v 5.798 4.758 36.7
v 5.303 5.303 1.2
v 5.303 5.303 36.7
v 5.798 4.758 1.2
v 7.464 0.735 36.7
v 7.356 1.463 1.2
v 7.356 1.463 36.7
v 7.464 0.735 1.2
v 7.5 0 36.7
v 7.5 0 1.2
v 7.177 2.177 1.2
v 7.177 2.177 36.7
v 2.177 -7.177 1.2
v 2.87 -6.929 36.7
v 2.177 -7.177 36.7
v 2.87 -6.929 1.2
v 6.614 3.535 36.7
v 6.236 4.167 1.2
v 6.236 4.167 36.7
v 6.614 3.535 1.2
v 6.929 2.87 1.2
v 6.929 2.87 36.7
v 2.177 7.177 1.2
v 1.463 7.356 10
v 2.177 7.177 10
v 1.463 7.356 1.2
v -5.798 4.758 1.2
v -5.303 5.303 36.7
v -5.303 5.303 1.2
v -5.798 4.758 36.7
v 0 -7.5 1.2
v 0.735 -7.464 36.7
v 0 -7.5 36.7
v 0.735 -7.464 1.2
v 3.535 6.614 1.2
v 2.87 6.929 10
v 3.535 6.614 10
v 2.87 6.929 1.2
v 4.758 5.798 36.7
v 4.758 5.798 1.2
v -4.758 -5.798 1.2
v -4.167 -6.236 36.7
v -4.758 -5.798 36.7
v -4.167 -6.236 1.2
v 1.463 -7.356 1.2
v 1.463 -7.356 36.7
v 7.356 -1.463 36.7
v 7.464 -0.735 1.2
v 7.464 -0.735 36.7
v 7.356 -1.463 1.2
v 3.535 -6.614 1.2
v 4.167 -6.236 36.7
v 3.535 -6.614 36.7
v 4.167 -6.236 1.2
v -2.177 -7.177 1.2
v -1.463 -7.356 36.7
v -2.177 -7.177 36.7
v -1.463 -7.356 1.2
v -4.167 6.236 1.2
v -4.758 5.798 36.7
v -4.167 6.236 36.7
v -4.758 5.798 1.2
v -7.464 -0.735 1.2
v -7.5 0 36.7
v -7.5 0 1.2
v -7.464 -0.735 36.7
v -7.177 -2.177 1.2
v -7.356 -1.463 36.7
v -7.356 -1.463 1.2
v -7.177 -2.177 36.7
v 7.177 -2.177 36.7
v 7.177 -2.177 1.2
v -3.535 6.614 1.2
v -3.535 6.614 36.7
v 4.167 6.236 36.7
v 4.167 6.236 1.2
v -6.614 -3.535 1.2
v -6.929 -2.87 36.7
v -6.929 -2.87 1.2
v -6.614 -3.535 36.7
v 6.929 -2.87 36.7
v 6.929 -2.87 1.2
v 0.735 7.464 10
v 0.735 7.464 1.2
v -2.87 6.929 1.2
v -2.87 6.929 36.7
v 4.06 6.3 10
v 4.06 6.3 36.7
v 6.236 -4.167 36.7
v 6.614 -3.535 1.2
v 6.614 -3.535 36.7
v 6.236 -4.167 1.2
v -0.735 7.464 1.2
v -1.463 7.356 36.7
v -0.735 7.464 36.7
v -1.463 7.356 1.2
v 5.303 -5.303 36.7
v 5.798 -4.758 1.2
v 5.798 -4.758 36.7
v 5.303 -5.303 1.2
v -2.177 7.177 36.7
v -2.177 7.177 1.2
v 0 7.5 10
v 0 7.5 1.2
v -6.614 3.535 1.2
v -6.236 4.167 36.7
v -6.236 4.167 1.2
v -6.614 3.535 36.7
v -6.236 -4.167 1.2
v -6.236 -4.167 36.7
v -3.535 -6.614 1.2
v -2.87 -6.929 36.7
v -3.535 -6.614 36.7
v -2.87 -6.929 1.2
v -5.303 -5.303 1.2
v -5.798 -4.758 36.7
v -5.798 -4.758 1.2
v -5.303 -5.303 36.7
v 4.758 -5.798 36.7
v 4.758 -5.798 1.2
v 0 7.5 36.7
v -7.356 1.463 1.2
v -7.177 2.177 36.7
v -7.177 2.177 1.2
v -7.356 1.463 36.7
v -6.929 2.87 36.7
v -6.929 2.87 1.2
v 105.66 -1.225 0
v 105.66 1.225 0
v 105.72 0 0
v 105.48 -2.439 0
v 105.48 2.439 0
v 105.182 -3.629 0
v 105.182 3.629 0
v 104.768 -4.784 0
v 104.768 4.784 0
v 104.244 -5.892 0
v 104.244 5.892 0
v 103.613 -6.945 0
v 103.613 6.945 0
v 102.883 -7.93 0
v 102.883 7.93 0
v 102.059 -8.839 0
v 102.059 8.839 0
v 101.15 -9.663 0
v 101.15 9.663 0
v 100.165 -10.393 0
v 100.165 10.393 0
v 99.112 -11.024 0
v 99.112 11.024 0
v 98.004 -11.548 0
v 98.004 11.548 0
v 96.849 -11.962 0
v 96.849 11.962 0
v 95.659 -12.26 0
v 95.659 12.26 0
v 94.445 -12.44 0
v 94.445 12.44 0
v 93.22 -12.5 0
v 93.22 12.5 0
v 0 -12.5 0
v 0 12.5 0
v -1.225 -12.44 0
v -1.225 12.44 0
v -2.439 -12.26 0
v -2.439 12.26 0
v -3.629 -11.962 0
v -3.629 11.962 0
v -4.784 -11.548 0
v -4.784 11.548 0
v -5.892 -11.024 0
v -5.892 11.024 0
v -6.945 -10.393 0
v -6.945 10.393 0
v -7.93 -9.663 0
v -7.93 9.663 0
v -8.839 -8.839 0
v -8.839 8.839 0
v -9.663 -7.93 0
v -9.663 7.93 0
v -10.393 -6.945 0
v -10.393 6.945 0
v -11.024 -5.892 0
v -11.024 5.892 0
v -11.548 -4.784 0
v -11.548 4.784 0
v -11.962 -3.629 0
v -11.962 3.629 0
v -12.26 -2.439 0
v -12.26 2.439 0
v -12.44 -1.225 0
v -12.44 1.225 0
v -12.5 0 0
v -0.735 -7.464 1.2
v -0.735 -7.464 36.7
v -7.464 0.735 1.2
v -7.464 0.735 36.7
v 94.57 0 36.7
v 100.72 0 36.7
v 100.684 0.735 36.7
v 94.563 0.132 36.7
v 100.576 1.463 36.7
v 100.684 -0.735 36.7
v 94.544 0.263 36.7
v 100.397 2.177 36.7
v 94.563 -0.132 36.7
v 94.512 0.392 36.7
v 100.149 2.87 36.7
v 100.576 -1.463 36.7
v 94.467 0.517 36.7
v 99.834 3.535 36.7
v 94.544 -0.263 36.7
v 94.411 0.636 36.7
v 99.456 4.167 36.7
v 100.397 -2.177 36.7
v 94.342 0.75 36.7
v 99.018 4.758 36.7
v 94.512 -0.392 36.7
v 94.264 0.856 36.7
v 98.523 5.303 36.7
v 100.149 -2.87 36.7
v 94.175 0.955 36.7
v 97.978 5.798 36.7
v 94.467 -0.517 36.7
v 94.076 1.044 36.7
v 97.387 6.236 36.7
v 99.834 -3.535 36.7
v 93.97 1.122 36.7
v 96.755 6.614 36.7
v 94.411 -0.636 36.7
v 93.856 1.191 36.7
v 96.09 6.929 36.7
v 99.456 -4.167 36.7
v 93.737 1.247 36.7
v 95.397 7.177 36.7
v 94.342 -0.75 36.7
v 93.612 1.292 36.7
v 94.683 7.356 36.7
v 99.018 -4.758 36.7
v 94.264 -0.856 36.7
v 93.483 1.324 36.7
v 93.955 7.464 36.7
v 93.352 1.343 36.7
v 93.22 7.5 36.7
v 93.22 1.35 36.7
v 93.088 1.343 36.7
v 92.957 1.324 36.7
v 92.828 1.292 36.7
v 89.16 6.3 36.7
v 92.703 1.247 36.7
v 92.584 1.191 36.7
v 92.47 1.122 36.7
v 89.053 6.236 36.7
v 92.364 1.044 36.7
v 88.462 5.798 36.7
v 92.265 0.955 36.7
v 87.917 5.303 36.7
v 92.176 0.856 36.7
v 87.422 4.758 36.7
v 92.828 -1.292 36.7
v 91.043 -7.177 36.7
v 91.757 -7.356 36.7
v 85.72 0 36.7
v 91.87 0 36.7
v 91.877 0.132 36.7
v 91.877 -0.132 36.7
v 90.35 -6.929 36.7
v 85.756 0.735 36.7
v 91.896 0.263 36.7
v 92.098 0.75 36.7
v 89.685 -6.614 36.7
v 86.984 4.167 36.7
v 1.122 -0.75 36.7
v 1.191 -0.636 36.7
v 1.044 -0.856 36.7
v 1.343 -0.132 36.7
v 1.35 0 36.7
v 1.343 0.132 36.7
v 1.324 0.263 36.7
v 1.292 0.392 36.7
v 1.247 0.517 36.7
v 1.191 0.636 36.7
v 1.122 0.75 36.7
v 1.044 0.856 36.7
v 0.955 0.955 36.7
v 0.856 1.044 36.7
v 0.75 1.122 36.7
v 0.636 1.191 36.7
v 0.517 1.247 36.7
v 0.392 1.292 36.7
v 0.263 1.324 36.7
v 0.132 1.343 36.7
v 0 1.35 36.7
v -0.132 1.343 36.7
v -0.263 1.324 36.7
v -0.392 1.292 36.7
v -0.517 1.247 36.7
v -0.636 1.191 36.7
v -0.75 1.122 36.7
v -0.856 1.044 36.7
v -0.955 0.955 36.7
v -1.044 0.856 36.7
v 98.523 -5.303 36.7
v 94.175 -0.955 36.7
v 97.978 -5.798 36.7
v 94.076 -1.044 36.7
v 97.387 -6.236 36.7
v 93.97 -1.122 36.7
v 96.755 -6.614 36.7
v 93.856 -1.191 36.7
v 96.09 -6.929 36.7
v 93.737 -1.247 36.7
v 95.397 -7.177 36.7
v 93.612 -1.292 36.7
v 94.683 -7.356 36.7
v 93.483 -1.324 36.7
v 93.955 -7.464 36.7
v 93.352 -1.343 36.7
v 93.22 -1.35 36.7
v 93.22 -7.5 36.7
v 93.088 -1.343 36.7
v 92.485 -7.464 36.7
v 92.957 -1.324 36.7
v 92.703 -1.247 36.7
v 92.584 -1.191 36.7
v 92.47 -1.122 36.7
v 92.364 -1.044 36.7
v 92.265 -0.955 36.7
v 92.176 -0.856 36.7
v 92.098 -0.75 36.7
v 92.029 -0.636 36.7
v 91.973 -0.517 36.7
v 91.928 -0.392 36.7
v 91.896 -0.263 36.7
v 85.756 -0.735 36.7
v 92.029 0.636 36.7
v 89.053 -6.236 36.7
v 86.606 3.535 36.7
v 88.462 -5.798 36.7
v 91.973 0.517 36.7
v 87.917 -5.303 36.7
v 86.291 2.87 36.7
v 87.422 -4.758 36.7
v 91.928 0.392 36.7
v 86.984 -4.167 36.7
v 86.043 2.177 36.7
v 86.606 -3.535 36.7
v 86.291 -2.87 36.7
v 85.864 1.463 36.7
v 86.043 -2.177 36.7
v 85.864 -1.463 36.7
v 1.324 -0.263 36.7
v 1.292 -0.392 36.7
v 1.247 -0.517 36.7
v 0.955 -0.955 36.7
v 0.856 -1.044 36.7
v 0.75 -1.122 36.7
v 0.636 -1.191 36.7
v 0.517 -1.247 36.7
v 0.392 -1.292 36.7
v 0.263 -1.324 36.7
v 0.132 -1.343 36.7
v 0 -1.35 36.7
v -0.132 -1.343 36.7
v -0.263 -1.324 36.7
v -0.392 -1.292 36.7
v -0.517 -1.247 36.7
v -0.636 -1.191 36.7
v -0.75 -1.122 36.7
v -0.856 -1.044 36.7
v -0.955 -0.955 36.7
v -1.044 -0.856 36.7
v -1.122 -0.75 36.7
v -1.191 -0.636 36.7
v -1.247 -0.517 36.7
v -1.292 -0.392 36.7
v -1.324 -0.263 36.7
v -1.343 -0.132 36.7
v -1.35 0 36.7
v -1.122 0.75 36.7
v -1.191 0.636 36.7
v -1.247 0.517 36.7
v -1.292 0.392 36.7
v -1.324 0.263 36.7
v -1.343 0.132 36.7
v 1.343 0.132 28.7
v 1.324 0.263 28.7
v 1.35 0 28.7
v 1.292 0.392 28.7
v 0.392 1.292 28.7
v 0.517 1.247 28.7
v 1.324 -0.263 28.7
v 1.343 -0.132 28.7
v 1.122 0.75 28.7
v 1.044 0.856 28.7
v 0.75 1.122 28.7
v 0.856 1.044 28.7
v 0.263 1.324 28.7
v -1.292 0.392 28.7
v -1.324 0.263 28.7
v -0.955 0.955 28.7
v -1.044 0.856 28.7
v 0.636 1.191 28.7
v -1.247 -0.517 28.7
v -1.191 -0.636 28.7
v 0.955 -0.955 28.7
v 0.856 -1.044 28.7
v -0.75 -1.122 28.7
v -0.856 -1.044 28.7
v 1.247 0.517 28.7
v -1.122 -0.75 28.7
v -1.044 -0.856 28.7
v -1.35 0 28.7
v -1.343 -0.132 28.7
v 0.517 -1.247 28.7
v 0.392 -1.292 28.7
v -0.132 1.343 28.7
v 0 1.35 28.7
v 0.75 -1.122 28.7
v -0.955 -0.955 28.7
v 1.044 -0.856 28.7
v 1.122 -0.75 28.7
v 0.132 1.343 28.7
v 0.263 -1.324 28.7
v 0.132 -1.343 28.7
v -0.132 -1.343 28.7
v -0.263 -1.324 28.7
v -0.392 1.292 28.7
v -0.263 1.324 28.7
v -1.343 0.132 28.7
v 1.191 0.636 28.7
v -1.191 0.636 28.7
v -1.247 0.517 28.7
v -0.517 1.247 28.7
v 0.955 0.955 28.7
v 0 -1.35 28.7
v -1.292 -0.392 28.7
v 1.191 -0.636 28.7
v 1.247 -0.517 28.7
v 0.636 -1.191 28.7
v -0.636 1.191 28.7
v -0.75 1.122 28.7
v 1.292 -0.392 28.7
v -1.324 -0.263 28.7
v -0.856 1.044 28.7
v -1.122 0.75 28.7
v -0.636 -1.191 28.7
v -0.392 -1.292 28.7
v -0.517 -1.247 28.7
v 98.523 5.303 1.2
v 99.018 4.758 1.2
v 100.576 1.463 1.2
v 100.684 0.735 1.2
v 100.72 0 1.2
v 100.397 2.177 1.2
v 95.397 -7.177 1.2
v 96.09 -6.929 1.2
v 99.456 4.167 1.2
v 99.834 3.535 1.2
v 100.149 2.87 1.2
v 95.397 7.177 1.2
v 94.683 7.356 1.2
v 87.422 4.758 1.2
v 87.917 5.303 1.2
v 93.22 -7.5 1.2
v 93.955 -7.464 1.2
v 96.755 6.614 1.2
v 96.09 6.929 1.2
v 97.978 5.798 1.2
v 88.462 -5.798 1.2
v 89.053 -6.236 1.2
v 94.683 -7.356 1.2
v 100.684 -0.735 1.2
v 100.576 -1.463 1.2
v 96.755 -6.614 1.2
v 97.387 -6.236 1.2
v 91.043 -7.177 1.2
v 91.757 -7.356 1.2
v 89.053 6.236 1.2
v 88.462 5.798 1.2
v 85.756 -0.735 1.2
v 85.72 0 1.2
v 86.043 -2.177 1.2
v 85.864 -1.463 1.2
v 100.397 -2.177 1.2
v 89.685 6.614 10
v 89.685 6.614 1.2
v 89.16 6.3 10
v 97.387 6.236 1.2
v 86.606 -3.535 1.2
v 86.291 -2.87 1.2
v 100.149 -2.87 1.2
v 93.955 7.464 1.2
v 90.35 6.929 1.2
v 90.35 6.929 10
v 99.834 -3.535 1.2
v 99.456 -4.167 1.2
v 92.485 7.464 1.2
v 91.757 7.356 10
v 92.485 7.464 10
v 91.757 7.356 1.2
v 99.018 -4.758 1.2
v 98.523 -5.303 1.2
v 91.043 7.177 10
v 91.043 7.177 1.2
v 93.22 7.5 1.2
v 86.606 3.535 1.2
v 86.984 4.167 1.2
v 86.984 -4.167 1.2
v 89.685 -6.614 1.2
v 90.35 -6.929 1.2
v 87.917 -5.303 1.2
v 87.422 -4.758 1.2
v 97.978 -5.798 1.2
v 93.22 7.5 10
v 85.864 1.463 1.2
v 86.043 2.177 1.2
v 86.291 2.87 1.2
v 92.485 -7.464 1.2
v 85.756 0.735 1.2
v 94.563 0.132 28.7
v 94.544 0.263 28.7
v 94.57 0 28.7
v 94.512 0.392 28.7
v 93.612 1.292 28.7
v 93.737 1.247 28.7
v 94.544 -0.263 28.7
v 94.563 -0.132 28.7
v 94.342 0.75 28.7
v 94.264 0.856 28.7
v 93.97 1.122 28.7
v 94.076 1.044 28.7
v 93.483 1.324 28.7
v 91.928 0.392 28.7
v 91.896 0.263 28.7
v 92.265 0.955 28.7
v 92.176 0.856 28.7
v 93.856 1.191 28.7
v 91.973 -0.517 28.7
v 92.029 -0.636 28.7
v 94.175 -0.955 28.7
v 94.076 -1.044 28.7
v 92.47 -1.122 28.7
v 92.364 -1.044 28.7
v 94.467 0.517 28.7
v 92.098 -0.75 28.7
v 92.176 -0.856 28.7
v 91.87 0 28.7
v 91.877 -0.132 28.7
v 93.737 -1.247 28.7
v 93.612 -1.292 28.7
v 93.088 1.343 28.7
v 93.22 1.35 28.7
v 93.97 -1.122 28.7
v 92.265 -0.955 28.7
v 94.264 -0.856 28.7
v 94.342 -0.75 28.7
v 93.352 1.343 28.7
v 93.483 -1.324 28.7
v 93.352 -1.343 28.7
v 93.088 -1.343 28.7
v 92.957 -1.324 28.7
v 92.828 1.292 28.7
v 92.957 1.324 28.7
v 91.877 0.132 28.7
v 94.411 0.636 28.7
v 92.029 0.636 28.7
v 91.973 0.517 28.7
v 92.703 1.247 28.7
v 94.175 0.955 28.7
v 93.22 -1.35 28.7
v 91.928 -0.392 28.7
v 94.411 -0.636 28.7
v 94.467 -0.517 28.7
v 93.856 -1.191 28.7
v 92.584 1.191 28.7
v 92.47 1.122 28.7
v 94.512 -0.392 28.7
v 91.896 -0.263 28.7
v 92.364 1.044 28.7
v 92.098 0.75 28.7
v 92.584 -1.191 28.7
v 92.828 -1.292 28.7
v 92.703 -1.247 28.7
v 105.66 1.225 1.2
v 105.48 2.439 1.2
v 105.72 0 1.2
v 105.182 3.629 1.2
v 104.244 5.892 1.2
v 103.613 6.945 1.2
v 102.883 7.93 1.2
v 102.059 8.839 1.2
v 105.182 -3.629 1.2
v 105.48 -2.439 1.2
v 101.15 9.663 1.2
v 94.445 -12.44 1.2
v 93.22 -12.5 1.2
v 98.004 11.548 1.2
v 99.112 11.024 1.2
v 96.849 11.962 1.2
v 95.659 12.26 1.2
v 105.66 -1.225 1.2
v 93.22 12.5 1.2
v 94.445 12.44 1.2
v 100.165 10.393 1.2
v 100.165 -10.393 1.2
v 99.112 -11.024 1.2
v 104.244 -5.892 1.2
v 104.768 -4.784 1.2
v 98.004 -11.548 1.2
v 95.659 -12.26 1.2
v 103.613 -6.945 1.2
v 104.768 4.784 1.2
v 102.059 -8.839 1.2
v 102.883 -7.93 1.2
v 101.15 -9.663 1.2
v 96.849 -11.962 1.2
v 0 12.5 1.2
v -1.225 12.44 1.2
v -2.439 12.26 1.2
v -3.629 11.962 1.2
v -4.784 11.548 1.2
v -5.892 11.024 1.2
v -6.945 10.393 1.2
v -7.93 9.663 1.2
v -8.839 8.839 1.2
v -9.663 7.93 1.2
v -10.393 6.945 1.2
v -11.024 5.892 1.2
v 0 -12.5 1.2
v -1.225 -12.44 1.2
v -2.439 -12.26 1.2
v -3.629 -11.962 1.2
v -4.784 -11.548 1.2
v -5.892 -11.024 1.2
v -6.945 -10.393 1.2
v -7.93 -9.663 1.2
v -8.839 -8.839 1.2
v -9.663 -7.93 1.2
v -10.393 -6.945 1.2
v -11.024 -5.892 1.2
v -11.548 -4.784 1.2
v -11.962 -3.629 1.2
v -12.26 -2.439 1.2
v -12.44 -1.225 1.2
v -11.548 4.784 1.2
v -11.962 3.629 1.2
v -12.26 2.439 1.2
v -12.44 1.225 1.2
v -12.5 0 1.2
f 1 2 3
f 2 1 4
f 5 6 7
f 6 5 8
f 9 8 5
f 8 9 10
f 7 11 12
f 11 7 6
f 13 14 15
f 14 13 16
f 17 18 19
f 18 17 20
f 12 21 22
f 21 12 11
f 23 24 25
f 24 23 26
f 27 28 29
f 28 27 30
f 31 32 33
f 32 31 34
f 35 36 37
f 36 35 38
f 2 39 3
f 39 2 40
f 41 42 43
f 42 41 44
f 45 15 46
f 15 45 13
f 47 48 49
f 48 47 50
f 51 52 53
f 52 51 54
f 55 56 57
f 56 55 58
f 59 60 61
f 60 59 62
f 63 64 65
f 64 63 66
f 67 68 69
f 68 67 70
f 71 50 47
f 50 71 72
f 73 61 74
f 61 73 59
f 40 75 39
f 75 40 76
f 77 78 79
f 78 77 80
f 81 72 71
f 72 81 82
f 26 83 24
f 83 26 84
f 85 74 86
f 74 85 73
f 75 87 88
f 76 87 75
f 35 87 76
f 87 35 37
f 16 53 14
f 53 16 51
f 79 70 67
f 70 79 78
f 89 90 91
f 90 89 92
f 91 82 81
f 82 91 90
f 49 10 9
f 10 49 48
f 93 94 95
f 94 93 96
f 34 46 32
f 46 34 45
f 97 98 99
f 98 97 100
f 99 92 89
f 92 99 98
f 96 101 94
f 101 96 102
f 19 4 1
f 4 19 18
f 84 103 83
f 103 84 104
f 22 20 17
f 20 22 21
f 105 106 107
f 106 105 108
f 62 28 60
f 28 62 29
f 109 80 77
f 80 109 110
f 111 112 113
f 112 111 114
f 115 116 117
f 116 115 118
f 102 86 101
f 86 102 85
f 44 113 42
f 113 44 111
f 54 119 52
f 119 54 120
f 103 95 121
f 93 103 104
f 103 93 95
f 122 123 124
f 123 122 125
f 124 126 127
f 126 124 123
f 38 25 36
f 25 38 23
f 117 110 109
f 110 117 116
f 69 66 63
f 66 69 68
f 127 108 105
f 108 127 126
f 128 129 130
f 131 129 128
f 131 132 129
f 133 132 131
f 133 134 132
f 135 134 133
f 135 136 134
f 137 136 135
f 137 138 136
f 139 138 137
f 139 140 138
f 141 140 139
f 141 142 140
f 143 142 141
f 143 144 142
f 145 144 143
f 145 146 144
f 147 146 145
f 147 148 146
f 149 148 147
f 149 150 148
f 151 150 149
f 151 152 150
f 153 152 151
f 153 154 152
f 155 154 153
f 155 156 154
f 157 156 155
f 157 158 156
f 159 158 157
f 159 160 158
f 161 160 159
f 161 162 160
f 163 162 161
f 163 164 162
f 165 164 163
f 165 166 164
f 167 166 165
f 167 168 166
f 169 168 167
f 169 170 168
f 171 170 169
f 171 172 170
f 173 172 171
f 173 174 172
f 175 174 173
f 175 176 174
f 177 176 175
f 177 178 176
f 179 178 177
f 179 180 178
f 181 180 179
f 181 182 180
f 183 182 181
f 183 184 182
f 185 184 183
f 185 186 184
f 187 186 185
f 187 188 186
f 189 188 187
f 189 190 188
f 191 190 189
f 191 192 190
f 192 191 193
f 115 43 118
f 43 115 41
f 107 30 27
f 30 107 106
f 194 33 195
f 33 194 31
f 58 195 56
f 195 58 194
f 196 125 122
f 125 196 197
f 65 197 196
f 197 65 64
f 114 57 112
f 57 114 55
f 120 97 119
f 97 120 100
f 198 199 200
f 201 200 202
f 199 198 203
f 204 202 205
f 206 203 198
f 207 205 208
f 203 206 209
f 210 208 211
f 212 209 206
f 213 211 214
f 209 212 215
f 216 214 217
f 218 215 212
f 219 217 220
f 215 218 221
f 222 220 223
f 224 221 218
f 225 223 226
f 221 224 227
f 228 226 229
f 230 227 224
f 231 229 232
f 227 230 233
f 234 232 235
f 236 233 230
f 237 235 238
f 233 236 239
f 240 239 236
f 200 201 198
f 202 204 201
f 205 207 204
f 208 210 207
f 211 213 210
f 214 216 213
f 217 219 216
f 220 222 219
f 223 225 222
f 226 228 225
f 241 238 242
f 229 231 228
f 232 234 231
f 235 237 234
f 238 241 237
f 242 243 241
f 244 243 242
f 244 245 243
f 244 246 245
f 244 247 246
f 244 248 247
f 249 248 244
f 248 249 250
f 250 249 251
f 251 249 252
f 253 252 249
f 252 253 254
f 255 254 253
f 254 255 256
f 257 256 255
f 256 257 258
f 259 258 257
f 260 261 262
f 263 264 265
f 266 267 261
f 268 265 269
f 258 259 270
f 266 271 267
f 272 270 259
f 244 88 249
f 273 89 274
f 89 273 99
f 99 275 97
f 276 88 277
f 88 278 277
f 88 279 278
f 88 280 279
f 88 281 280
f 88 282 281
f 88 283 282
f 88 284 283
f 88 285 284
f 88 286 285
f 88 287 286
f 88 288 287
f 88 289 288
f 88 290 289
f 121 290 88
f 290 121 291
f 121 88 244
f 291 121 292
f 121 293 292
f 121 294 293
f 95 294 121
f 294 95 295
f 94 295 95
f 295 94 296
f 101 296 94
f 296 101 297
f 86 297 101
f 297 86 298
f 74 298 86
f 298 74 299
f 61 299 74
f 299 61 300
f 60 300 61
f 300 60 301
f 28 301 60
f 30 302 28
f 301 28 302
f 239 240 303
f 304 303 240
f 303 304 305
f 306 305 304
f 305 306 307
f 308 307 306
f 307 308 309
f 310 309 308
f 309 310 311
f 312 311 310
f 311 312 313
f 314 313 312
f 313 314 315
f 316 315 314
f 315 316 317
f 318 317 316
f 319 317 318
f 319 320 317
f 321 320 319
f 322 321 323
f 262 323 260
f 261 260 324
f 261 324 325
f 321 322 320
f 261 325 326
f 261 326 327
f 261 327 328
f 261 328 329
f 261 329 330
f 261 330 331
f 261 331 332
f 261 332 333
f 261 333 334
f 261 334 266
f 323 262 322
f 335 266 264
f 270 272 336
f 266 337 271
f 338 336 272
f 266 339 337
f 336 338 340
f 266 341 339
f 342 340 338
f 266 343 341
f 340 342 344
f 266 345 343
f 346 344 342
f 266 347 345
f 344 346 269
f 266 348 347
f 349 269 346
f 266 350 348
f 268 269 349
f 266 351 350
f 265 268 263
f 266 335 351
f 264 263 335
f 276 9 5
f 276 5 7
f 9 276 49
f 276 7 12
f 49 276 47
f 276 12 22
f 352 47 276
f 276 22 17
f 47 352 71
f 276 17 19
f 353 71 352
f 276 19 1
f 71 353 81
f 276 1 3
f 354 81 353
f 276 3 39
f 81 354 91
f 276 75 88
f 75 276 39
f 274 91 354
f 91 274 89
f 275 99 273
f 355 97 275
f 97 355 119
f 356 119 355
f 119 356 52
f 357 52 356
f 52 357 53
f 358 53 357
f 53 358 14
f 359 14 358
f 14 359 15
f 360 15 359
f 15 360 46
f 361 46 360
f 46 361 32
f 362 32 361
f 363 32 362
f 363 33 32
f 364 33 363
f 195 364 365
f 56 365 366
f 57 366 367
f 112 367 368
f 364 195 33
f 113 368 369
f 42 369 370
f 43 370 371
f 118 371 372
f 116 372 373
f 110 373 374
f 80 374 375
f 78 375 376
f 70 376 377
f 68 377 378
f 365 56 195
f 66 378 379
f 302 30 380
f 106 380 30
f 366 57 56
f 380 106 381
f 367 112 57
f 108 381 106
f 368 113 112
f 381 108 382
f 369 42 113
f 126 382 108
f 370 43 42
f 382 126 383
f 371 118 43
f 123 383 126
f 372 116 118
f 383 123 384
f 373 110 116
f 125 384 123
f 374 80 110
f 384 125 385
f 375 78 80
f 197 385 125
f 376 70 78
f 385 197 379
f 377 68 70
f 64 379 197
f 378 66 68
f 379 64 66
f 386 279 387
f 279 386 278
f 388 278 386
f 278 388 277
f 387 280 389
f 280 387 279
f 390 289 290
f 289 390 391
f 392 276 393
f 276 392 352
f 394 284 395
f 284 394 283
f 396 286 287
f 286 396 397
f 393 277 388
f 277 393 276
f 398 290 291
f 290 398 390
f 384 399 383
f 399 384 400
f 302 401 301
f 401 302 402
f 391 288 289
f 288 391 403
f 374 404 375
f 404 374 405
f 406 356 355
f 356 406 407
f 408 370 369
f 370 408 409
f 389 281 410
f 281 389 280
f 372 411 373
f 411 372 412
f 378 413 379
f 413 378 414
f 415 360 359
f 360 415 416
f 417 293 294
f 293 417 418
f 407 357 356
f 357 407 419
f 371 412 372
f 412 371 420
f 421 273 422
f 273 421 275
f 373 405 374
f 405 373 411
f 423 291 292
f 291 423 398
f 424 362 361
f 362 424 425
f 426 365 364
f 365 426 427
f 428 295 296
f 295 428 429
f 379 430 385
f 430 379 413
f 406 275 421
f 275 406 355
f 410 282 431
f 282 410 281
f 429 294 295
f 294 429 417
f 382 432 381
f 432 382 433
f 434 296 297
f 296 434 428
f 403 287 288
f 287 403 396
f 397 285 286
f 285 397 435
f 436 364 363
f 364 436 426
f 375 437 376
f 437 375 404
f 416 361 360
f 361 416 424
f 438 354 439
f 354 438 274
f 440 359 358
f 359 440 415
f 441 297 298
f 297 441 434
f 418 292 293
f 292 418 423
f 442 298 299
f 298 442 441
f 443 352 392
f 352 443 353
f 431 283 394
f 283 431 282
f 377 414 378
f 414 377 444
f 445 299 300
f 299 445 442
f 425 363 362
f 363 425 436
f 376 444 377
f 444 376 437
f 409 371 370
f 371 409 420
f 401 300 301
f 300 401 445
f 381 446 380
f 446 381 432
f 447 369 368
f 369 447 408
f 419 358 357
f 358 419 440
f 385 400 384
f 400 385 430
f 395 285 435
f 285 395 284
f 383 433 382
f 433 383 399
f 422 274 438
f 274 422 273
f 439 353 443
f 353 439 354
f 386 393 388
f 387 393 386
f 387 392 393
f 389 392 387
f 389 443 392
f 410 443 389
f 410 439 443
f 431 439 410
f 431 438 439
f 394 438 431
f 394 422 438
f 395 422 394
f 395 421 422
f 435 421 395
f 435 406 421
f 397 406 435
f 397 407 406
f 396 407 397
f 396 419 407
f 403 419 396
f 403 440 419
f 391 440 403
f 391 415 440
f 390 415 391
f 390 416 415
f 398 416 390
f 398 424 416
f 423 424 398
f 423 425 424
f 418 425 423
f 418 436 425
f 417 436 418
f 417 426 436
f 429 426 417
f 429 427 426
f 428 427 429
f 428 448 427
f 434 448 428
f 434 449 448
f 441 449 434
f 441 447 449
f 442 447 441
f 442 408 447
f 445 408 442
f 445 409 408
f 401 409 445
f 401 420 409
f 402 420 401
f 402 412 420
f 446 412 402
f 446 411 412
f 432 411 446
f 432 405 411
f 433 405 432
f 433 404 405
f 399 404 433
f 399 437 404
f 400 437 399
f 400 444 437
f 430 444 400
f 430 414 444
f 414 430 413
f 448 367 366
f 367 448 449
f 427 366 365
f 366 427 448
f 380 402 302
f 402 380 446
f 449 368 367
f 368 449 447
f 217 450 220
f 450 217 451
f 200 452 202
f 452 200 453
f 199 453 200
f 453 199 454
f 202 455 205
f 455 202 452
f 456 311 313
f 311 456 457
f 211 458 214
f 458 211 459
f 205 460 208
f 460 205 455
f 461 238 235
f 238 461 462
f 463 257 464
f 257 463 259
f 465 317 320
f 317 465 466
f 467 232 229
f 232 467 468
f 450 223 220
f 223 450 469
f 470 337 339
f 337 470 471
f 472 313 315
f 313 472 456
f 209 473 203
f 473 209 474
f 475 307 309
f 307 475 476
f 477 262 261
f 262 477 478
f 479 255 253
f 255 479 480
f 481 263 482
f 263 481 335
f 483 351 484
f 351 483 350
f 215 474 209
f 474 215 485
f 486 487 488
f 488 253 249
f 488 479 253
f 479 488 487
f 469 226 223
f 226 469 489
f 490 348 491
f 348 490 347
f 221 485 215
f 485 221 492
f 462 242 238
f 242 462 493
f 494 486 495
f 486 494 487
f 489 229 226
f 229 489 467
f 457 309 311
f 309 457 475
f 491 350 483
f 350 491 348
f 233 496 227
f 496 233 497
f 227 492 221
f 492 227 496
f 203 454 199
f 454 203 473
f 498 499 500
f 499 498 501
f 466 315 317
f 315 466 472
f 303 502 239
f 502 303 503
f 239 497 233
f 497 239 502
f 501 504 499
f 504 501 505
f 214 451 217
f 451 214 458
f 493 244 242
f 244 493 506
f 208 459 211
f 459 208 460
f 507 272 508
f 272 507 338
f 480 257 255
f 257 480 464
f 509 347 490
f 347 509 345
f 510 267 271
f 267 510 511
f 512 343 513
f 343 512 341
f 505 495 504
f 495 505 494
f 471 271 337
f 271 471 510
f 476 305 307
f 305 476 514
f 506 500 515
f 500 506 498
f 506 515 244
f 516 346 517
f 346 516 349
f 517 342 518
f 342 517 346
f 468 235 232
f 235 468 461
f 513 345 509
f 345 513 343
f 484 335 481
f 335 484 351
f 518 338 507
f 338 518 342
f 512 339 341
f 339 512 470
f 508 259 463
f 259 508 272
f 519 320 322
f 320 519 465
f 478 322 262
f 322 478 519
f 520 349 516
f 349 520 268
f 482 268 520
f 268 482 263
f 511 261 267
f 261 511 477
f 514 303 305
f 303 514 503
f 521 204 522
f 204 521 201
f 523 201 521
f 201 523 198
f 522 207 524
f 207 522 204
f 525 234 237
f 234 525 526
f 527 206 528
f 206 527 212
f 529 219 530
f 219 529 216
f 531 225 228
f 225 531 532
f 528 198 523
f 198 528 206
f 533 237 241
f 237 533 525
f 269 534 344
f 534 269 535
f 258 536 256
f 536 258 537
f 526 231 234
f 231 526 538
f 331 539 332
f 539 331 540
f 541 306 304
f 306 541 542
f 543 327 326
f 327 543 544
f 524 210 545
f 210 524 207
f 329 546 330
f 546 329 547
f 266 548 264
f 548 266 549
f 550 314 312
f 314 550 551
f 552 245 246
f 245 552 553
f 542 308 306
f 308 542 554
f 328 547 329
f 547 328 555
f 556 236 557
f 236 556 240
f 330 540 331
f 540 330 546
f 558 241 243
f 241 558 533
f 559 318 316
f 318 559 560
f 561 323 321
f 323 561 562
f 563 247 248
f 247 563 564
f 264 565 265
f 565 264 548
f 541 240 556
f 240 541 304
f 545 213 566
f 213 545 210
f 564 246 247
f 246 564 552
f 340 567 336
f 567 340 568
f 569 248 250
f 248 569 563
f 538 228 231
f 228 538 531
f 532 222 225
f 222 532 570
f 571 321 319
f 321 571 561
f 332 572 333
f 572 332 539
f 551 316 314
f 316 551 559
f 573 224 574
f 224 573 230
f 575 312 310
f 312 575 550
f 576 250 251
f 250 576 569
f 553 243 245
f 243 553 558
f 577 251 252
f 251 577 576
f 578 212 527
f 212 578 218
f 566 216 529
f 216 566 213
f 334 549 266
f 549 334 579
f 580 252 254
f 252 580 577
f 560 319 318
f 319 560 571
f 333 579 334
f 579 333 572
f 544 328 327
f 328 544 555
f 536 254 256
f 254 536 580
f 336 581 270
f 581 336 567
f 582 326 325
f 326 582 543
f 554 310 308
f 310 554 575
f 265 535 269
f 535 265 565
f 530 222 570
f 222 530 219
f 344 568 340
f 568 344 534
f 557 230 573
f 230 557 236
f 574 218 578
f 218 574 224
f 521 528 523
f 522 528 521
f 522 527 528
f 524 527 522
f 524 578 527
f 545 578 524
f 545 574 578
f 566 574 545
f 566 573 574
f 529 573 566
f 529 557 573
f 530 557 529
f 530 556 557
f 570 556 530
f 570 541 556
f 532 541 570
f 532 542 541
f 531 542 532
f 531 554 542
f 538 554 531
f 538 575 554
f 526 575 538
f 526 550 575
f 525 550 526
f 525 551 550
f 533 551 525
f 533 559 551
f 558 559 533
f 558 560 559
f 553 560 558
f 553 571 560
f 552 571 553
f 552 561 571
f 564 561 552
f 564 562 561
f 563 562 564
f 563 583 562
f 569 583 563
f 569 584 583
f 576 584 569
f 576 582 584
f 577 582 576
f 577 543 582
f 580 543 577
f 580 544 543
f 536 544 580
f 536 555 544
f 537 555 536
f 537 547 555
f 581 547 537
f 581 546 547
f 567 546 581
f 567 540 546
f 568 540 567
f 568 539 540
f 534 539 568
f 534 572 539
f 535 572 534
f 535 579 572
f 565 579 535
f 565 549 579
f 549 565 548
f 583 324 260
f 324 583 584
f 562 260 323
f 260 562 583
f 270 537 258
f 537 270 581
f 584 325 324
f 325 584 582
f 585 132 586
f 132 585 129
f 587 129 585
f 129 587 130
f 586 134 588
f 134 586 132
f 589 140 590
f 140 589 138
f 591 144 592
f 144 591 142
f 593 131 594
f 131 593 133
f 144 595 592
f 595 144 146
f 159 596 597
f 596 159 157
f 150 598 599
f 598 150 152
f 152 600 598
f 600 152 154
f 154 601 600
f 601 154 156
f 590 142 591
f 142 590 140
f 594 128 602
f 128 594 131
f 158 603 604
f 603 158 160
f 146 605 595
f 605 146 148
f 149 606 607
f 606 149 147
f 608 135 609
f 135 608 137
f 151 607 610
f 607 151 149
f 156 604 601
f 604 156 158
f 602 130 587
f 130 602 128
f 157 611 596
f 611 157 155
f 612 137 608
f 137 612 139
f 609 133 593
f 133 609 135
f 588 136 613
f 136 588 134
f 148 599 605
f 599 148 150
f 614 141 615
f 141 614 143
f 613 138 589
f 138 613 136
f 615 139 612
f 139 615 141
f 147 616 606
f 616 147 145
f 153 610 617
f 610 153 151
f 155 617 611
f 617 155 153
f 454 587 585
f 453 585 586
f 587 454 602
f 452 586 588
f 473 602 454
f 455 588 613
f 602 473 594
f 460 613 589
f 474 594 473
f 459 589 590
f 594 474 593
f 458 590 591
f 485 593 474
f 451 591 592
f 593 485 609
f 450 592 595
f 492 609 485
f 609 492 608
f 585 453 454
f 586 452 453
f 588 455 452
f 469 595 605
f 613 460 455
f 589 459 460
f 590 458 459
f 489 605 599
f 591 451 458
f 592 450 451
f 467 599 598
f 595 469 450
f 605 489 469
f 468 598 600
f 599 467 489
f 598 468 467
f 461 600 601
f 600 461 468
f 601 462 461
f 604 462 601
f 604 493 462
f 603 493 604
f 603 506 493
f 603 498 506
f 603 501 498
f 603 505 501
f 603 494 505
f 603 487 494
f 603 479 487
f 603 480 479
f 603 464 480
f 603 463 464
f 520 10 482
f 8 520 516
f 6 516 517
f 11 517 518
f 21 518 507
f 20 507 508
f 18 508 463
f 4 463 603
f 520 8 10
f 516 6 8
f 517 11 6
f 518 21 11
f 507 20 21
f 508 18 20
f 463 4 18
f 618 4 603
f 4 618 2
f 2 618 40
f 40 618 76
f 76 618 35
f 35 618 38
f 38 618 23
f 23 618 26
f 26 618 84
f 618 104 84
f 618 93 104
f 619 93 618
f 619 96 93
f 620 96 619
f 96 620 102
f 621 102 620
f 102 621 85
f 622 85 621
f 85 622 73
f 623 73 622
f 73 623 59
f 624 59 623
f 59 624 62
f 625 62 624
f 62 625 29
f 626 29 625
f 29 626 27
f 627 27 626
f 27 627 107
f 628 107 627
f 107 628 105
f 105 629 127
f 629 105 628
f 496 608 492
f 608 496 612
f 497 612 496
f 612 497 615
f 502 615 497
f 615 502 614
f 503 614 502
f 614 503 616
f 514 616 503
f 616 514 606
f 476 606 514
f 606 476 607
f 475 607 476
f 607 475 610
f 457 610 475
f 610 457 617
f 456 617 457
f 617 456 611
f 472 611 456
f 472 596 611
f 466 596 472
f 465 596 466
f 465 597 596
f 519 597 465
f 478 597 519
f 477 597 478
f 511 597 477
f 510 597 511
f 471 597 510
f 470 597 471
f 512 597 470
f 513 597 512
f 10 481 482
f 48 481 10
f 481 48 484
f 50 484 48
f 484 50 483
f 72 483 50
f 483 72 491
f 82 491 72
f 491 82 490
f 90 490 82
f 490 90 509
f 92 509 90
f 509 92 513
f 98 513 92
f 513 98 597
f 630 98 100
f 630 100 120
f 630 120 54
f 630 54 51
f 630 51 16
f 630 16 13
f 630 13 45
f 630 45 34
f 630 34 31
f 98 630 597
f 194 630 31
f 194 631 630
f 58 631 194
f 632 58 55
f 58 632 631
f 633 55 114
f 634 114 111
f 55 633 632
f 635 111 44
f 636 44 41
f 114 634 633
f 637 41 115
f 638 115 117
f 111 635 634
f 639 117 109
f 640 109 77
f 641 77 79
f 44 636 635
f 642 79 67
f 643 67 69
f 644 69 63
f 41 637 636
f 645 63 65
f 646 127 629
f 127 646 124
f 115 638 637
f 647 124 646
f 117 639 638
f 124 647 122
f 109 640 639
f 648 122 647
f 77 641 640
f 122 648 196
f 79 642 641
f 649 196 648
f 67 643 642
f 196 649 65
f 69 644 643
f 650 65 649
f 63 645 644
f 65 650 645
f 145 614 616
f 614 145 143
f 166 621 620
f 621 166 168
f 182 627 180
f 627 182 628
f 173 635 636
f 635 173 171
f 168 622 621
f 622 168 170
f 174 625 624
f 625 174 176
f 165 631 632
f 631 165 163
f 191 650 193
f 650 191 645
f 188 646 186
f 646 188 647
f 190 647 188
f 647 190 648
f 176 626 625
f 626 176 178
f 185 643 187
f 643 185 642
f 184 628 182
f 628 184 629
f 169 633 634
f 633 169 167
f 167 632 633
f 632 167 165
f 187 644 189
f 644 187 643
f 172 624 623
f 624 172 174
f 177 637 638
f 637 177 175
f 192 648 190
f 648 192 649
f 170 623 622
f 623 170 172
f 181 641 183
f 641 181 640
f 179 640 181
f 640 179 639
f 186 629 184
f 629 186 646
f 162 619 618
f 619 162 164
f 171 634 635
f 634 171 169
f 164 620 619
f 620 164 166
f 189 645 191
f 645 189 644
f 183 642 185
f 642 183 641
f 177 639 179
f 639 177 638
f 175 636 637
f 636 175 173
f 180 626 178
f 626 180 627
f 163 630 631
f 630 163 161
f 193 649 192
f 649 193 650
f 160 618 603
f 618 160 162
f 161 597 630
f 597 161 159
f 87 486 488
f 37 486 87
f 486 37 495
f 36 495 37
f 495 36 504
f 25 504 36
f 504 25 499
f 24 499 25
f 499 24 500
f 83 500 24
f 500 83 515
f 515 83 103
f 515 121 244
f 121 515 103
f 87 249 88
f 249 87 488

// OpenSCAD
E2E_BAR = 97.72;
BAR_HOLE_SIZE = 4.5;
BAR_THICK = 1;
FELT_SIZE = 15;
FELT_THICK = 3;
STAND_BOTTOM = 25;
SCREW_H = 12;
SCREW_D = 2.7;
SOLENOID_HEIGHT = 33;
SOLENOID_STROKE = 6;
THIN_THICK = 1.2;

total_height = SOLENOID_STROKE + THIN_THICK + SOLENOID_HEIGHT - FELT_THICK - .5;

$fn = $preview ? 32: 64;
module stand() {
    screw_d1 = 5.6;
    screw_d2 = 4.8;
    screw_h = SCREW_H;
    difference() {
        cylinder(d=FELT_SIZE, h=total_height);
        combined_thick = screw_h - (BAR_THICK + FELT_THICK);
        translate([0,0,total_height-combined_thick])
        cylinder(d=SCREW_D, h=combined_thick);
    }
}


wall_height = 10;
union() {
    stand();
    translate([E2E_BAR-BAR_HOLE_SIZE,0,0]) {
        stand(); 
        cylinder(h=THIN_THICK, d=STAND_BOTTOM);
    }
    cylinder(h=THIN_THICK, d=STAND_BOTTOM);
    translate([0,(-STAND_BOTTOM)/2,0]) {
        cube([E2E_BAR-BAR_HOLE_SIZE,STAND_BOTTOM, THIN_THICK]);
    }
    if (total_height > 15) {
        translate([0,FELT_SIZE/2-THIN_THICK,wall_height])
        cube([E2E_BAR-BAR_HOLE_SIZE,THIN_THICK, total_height-wall_height]);
    }
}
